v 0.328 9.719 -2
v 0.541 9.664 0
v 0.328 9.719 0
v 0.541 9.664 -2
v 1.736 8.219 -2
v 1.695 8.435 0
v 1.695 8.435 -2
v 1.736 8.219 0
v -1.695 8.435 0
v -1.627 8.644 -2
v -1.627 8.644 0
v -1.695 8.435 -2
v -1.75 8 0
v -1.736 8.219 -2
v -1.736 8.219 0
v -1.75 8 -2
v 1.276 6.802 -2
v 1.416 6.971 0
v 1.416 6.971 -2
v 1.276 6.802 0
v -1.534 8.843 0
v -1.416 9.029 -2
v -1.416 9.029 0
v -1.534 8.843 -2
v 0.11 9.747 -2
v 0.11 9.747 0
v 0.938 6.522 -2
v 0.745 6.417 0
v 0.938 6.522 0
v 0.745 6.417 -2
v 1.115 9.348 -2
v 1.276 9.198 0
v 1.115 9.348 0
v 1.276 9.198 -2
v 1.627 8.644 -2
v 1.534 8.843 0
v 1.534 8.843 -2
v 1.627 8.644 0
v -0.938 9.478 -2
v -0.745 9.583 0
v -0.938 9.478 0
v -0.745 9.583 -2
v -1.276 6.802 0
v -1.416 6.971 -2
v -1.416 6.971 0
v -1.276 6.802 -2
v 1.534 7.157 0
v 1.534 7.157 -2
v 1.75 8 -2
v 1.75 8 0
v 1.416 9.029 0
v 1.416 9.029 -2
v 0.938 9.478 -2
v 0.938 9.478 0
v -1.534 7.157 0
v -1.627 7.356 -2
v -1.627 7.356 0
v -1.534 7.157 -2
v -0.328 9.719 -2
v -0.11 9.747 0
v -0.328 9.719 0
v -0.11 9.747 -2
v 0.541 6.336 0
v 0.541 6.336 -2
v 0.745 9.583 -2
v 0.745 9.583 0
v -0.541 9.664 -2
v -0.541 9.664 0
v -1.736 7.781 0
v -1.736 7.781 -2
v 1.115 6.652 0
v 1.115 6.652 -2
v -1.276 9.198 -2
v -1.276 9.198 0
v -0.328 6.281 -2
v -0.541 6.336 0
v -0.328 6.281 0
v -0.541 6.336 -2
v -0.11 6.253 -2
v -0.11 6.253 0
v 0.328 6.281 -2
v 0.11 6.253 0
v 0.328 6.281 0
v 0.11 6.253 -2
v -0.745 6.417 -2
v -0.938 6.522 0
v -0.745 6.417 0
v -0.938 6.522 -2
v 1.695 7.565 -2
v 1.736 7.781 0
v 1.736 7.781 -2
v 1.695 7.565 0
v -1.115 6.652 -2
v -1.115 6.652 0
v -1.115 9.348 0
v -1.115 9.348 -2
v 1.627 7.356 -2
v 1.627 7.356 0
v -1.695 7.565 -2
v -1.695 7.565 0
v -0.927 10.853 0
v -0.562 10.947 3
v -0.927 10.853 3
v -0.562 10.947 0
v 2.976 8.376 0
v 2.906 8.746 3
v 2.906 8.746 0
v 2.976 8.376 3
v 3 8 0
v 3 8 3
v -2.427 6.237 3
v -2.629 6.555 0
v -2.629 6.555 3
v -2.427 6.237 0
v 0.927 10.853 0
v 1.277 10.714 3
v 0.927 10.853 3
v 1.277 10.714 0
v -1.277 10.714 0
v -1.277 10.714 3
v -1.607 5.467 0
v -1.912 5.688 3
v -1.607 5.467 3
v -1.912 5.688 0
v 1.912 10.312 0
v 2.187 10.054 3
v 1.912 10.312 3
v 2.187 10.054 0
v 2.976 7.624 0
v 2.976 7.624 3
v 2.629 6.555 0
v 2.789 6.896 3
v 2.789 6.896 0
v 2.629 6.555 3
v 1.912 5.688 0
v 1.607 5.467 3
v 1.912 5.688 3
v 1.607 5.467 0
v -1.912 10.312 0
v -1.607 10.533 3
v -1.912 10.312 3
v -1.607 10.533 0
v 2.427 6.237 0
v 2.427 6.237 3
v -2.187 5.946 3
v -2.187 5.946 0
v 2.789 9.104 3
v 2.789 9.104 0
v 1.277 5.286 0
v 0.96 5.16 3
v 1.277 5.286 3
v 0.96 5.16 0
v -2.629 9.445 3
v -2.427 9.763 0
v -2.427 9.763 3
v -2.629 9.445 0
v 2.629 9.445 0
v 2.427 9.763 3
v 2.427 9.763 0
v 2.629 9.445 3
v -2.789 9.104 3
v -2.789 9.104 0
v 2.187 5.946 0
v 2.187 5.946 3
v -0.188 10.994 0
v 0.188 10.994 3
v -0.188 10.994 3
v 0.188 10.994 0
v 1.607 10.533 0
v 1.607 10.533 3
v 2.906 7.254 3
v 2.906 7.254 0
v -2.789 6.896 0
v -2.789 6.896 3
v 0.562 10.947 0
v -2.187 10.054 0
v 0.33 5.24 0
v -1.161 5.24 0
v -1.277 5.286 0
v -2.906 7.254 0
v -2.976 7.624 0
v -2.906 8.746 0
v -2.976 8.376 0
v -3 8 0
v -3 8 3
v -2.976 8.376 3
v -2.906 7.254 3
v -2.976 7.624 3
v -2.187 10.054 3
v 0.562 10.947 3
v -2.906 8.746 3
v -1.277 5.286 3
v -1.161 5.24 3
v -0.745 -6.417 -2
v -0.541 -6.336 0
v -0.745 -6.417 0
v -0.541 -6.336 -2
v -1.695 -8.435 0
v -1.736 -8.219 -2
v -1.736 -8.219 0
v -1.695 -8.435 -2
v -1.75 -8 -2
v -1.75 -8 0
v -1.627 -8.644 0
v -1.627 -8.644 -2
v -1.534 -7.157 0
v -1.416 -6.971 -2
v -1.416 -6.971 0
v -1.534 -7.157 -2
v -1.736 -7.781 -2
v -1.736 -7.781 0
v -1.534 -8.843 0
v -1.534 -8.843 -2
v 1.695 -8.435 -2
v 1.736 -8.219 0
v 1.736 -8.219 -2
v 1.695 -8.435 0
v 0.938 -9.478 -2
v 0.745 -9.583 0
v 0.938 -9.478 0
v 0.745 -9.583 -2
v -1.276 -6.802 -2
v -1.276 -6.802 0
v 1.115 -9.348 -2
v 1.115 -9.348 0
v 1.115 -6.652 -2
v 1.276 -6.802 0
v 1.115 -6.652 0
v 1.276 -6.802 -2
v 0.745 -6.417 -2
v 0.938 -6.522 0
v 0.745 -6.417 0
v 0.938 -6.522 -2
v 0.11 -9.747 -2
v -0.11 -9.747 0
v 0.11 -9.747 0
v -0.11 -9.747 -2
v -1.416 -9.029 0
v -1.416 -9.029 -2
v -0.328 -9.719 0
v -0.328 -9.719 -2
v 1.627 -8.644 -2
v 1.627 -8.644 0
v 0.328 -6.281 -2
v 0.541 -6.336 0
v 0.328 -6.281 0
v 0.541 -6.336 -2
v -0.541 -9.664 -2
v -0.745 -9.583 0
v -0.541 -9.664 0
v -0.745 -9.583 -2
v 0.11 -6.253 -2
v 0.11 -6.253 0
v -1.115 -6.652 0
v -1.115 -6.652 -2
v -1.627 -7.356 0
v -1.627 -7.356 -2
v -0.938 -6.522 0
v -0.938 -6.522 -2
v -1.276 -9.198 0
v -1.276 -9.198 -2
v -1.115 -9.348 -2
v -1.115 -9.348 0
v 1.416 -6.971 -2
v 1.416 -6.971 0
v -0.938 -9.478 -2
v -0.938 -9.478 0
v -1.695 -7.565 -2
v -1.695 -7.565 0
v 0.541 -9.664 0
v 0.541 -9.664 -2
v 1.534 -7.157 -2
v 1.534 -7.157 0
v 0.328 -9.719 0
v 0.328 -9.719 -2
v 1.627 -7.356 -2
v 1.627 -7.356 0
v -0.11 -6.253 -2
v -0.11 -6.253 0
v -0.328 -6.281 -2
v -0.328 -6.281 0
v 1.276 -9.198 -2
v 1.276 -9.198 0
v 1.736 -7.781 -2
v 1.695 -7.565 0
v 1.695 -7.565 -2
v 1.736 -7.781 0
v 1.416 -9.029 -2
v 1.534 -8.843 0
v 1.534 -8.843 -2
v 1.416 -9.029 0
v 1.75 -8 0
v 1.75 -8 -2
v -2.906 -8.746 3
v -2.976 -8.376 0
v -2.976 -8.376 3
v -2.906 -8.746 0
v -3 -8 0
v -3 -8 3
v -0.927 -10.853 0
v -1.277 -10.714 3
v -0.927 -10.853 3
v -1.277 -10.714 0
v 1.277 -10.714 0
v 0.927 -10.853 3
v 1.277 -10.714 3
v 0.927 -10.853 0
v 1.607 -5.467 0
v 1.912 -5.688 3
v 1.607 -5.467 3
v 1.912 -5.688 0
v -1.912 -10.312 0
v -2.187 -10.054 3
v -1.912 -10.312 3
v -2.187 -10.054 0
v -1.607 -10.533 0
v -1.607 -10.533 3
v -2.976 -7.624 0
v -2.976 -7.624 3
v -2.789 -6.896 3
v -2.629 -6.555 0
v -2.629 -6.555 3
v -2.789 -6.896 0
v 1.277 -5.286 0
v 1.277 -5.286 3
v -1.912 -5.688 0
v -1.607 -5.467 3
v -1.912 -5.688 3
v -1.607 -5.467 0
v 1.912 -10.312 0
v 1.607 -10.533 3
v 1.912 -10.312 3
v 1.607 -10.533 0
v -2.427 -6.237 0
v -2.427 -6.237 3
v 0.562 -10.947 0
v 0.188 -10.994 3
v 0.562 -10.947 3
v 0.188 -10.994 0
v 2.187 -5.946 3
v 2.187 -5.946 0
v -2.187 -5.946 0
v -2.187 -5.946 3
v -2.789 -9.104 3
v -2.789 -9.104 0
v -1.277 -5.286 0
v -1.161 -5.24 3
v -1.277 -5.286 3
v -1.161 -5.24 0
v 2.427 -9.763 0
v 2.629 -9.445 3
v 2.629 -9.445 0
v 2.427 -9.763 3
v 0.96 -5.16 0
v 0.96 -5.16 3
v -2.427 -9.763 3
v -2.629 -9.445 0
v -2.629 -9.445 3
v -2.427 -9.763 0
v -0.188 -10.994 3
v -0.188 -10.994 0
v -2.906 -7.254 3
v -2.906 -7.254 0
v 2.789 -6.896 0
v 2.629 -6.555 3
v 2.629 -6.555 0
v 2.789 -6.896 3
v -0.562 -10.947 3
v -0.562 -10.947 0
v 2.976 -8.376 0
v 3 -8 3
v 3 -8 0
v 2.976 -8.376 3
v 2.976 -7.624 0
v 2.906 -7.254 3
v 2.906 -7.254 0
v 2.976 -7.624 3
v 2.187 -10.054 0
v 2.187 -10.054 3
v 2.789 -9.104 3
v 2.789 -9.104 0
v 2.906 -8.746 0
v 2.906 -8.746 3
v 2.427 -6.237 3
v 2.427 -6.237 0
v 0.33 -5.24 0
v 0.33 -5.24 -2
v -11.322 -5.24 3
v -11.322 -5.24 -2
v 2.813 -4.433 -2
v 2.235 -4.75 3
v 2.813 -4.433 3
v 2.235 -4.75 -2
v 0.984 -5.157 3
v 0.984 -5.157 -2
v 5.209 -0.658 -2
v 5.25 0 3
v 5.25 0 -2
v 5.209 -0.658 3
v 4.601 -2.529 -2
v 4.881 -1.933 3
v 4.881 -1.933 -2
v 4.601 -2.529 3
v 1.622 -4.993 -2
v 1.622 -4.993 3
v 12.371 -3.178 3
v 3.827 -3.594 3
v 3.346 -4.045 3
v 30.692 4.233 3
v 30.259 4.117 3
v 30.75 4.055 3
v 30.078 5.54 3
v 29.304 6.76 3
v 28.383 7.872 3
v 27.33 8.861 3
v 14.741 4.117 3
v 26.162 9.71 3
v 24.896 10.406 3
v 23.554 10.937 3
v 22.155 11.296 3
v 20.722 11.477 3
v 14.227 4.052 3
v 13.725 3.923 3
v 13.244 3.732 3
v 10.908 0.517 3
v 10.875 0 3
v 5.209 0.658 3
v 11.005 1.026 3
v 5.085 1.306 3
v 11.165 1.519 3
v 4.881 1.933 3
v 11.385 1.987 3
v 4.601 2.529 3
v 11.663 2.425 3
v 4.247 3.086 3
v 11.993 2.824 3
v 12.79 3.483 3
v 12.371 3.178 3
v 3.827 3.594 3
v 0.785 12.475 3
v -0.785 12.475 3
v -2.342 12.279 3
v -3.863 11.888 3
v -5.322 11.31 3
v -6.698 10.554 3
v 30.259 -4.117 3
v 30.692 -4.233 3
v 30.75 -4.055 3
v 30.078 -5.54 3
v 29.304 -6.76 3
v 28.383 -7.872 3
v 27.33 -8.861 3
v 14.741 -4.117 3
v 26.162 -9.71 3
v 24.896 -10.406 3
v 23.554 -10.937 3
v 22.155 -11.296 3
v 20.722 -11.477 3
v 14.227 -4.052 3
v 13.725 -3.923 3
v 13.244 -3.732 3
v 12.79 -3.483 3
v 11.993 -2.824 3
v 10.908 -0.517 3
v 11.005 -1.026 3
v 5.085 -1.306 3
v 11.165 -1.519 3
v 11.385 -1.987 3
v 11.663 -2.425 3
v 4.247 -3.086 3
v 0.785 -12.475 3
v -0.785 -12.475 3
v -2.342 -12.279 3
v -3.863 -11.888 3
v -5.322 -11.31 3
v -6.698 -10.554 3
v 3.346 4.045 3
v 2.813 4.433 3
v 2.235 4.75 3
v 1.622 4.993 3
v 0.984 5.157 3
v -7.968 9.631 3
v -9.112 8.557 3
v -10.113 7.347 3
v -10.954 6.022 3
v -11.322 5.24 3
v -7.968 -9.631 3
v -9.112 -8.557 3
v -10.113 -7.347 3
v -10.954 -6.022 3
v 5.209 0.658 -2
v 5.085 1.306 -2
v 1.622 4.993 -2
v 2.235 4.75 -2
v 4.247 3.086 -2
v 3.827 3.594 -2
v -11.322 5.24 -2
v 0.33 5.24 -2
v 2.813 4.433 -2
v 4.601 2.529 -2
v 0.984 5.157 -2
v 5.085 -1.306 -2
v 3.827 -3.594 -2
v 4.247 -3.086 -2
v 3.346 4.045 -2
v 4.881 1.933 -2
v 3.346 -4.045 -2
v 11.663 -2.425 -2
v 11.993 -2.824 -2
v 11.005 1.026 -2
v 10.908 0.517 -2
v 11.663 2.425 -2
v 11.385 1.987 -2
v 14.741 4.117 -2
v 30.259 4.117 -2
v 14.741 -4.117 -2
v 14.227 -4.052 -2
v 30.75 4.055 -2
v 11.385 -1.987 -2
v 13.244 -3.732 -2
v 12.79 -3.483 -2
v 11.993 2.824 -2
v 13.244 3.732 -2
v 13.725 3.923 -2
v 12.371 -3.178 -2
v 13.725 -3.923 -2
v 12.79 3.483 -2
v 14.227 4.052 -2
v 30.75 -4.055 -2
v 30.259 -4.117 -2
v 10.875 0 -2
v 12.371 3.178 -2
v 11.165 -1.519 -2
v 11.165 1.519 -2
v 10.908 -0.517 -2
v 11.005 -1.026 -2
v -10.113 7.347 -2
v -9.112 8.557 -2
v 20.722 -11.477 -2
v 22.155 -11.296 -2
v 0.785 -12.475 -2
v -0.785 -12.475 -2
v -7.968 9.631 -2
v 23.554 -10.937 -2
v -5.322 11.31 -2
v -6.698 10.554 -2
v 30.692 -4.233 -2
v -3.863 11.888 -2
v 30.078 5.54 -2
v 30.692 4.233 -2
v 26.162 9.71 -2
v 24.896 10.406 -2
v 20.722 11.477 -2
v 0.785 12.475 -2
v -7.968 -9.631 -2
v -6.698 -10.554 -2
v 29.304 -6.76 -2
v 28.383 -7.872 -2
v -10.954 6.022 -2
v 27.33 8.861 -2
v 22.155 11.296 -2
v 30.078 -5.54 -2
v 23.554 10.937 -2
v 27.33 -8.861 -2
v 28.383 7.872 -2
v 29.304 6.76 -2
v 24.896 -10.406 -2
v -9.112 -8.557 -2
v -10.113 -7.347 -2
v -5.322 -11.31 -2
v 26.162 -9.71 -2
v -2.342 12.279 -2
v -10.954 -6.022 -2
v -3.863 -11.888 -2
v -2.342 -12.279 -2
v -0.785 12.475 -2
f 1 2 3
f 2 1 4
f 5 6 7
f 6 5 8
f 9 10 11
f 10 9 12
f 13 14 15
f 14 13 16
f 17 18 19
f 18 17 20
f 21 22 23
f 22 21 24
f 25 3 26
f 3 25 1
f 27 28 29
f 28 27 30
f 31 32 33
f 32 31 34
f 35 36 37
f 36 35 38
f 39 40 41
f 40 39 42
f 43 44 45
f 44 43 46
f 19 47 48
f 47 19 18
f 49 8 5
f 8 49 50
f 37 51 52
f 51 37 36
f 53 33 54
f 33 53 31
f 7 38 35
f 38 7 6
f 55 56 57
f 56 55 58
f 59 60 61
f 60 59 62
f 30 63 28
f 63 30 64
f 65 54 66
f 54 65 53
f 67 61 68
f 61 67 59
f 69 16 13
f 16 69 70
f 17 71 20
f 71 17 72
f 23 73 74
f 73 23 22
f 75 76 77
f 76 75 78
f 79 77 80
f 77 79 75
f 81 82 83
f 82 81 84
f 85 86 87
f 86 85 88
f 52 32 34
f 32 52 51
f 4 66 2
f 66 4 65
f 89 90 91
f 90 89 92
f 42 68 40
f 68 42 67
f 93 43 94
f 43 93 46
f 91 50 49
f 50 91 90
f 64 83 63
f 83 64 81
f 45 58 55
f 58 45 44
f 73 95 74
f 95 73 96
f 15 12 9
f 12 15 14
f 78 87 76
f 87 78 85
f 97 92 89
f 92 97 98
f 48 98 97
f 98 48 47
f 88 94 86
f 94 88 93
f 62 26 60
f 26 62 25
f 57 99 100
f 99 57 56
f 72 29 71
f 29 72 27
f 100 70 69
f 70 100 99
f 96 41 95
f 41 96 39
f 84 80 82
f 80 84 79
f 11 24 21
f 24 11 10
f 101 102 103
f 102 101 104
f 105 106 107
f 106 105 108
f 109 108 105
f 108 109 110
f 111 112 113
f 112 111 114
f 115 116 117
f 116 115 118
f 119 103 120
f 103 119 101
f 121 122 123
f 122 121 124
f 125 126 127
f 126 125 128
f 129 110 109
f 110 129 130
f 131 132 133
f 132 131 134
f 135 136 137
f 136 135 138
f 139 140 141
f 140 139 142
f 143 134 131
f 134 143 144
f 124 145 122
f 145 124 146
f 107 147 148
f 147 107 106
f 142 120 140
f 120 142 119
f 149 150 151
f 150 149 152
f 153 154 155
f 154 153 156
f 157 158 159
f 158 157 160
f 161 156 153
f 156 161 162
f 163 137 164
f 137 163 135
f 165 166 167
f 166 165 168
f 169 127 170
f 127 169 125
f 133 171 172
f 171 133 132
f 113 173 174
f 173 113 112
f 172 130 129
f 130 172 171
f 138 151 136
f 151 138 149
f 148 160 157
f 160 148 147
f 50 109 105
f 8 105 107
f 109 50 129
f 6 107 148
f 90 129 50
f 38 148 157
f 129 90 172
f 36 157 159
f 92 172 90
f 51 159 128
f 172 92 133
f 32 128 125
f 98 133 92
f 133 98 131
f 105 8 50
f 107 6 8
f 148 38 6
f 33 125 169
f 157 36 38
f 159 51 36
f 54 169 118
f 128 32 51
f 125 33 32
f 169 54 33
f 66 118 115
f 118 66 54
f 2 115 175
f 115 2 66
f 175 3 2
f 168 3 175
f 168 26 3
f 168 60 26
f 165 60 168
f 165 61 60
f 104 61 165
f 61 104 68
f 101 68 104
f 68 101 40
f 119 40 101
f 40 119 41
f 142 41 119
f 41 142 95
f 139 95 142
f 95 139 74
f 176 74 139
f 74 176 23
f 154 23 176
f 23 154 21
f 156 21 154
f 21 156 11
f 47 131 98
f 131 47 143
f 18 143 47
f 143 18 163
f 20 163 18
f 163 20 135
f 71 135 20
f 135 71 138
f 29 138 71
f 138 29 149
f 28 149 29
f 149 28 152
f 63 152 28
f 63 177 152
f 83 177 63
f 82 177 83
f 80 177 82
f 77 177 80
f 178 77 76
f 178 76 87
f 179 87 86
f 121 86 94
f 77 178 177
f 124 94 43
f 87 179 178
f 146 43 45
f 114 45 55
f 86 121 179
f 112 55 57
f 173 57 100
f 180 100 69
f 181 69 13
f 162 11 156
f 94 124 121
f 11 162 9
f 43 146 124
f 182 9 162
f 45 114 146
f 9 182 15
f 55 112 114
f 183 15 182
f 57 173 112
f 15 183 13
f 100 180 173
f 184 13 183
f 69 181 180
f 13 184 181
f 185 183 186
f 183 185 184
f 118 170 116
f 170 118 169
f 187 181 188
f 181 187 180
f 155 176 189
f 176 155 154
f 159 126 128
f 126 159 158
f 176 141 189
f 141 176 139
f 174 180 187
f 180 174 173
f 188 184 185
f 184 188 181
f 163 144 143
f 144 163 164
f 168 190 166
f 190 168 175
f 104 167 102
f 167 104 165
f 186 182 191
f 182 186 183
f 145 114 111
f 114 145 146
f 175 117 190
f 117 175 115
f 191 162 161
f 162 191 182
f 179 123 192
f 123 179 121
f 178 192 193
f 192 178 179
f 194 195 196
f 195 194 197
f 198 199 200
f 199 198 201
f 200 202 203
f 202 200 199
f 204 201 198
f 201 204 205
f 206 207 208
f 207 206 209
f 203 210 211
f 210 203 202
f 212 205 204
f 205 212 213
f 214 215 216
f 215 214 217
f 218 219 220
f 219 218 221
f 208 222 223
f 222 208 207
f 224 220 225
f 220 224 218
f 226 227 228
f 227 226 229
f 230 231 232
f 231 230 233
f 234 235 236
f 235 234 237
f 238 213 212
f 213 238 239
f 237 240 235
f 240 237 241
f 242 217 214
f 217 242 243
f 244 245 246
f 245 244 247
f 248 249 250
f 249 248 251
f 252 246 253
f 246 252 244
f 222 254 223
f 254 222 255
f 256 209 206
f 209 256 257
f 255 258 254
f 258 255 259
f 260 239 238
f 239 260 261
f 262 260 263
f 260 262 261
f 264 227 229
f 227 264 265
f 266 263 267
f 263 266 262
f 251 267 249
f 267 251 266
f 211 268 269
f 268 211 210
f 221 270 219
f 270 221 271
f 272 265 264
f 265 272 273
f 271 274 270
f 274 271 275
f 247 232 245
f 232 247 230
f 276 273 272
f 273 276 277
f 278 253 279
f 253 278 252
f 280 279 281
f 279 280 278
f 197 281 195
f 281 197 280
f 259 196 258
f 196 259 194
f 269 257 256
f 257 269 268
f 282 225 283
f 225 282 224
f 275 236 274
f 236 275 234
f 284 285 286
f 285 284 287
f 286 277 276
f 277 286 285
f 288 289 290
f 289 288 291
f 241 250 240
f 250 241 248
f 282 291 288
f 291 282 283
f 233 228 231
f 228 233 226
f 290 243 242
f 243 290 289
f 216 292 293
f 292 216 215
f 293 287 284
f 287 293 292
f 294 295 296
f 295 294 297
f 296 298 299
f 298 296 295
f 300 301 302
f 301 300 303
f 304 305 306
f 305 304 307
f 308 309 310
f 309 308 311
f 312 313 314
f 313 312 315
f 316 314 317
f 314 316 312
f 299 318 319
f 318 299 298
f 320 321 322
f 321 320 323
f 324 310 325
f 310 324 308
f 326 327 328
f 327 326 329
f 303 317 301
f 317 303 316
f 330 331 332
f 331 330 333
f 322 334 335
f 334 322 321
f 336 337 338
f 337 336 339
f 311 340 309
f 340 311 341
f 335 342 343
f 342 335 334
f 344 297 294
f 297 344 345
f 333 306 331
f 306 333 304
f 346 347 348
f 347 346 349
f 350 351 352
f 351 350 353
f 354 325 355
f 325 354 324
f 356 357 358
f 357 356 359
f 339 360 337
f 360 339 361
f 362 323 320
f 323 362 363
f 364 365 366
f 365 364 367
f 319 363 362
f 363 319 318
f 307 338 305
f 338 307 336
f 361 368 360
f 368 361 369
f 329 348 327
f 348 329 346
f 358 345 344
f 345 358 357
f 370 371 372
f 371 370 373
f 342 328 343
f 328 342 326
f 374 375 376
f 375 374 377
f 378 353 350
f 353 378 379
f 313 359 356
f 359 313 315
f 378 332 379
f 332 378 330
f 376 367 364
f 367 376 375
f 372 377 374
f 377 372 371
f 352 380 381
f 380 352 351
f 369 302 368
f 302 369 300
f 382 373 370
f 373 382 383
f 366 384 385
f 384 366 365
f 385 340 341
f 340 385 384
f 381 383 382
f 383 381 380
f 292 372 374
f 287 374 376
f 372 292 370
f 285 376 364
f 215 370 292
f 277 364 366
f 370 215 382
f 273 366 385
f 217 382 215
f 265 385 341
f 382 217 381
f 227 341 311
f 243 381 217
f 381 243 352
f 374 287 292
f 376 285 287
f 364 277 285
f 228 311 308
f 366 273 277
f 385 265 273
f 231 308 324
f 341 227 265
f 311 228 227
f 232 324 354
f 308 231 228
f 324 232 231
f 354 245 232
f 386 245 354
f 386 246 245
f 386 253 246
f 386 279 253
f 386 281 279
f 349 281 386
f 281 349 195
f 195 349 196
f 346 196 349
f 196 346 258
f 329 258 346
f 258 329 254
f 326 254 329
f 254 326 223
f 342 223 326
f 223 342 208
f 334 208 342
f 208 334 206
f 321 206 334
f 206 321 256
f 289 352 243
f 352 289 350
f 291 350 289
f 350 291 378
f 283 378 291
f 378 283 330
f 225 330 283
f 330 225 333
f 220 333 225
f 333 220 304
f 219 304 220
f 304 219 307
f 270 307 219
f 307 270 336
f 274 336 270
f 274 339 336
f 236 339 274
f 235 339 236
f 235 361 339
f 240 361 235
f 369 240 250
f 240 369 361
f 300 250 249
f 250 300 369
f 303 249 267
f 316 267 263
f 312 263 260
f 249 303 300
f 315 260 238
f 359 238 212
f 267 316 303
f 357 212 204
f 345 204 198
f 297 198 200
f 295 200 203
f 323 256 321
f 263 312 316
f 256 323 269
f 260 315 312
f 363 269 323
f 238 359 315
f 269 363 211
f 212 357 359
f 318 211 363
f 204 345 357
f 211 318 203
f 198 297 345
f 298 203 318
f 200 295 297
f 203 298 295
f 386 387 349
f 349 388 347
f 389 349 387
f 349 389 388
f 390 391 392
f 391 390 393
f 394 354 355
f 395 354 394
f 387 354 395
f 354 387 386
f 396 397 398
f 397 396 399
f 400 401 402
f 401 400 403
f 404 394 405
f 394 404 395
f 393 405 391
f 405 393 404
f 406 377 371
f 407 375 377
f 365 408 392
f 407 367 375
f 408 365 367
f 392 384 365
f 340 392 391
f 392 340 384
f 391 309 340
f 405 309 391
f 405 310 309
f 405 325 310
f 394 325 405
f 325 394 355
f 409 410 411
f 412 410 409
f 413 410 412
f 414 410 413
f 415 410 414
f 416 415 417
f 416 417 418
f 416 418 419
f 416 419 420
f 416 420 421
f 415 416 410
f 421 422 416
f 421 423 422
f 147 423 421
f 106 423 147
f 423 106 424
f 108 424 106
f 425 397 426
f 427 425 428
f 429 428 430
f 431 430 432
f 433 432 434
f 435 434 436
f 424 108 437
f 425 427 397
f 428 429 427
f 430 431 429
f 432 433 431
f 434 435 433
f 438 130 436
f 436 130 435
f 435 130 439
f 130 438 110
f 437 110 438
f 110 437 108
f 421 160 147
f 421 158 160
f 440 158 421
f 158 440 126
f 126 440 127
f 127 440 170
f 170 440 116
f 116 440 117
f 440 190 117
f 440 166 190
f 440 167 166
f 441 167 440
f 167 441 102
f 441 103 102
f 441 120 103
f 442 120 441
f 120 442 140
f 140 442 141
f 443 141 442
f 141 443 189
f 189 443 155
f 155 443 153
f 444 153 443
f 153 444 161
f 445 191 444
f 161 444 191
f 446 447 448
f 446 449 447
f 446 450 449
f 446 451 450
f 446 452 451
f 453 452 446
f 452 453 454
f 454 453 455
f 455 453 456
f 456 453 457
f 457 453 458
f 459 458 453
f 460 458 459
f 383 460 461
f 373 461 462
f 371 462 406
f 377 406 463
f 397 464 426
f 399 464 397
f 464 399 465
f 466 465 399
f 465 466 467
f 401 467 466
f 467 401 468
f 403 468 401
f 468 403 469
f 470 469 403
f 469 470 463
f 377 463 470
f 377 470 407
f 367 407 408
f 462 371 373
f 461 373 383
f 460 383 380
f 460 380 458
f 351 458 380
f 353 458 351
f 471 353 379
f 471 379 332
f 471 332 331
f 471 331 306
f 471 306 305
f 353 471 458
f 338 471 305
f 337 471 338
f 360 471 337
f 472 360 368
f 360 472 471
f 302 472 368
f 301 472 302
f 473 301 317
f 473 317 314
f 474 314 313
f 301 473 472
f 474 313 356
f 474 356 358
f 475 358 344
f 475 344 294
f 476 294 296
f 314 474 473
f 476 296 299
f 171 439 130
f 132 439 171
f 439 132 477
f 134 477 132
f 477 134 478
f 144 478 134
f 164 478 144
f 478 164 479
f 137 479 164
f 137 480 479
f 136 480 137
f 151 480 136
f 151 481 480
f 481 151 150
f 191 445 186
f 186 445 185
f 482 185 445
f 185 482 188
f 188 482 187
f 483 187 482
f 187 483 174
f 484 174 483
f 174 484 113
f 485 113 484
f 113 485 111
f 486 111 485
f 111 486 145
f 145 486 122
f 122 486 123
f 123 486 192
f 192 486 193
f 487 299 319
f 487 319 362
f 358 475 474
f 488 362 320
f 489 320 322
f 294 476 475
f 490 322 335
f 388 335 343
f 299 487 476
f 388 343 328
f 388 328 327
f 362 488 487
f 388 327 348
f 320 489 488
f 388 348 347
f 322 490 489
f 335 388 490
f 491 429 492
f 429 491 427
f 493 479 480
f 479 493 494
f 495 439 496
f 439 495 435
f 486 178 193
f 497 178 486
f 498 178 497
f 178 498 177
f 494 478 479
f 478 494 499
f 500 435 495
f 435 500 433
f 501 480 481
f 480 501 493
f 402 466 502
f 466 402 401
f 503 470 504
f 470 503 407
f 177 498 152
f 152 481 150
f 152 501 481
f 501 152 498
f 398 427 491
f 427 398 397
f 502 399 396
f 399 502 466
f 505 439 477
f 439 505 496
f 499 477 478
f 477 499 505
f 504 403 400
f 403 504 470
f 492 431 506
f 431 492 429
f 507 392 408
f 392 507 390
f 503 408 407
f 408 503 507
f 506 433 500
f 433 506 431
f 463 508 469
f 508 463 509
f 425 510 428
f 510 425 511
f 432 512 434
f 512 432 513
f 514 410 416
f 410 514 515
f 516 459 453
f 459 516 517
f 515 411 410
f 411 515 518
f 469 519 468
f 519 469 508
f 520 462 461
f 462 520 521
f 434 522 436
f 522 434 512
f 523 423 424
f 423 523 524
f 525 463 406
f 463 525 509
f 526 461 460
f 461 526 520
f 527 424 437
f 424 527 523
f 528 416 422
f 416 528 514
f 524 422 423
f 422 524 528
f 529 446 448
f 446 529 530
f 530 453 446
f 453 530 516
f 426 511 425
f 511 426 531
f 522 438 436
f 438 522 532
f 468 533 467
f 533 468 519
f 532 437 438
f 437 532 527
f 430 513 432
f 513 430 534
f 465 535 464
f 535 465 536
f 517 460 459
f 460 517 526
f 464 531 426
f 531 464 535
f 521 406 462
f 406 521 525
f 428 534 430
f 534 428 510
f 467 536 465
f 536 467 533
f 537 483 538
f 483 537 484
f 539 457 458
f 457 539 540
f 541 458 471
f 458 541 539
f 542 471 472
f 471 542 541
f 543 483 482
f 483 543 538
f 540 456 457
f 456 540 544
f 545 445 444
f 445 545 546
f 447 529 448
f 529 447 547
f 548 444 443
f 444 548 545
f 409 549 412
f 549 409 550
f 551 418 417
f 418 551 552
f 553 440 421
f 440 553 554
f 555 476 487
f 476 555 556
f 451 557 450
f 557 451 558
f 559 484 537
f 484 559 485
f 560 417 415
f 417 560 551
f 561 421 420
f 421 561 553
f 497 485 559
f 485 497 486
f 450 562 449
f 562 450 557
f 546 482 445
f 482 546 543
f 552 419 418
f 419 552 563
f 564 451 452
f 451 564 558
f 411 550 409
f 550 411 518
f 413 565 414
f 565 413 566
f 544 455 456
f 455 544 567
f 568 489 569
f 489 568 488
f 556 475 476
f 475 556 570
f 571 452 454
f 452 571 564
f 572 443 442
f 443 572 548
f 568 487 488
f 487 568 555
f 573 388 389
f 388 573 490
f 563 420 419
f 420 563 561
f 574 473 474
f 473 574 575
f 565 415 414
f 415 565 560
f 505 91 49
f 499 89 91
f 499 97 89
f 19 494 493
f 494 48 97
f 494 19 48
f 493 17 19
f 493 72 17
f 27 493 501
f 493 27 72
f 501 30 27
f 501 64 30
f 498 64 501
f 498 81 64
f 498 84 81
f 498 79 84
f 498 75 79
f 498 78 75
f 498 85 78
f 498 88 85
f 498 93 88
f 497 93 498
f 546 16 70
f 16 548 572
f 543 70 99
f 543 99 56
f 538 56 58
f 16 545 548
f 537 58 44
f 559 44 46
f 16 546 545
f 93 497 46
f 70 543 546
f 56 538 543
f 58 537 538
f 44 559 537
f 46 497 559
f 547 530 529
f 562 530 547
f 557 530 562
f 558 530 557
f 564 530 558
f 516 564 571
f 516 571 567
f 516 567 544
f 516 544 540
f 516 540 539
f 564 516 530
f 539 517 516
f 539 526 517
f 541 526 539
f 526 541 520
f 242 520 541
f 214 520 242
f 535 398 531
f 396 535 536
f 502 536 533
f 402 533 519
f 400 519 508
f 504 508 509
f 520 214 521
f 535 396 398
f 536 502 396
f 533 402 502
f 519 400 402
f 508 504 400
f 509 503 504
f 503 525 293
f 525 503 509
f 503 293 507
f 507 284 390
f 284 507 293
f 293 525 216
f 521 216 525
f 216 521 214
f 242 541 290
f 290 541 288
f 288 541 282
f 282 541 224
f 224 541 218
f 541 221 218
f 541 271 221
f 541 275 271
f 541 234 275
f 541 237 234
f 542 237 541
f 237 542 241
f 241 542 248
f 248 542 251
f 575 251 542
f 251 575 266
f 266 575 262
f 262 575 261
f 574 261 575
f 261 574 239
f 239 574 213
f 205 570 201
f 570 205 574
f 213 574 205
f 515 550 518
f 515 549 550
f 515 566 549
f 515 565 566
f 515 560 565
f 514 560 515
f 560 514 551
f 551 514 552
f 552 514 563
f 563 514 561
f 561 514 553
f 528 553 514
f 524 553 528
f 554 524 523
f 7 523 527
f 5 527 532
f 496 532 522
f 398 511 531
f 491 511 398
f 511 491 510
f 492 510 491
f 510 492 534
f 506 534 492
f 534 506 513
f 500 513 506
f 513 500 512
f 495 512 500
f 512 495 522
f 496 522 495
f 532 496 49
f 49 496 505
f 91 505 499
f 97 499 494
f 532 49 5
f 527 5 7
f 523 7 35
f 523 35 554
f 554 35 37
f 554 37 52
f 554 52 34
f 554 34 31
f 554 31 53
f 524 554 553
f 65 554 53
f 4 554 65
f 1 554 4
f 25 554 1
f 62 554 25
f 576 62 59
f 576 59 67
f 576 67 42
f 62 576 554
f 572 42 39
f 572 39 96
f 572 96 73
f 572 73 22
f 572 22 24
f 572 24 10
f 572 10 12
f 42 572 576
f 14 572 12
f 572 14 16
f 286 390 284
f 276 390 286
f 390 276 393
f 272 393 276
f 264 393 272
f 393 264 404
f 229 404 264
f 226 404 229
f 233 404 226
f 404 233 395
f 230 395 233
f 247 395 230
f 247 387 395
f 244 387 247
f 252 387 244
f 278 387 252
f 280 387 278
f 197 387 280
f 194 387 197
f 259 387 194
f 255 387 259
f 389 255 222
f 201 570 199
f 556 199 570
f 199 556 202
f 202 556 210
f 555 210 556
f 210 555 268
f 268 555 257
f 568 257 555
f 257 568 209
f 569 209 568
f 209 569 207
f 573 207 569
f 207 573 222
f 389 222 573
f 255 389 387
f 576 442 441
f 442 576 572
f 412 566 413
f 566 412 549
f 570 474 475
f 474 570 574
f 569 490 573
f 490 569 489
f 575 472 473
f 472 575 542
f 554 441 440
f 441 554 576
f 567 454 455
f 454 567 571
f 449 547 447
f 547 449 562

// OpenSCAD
screw_len=6; //total threaded length
minus=4;
$fn=50;

//color([0.6,0.2,0.3])import("anti-z-wobbling.stl");

difference(){
hull()
{
cylinder(d=25,3);
translate([20,0,0])cylinder(d=23,3);
translate([0,0,-screw_len+minus])cylinder(d=25,screw_len-minus);
translate([20,0,-screw_len+minus])cylinder(d=23,screw_len-minus);
}

for(i=[0:1]){
rotate(i*-360/2){translate([0,8,-screw_len-1])cylinder(d=3.5,screw_len+5);
translate([0,8,0])cylinder(d=6,4);
   }
   }

translate([0,0,-screw_len-3]){
hull(){
cylinder(d=10.5,screw_len*2);
translate([-13,0,0])cylinder(d=10.5,screw_len*2);
}
hull(){
translate([15,0,0])cylinder(d=8.25,screw_len*2);
translate([30,0,0])cylinder(d=8.25,screw_len*2);
}
}
}
